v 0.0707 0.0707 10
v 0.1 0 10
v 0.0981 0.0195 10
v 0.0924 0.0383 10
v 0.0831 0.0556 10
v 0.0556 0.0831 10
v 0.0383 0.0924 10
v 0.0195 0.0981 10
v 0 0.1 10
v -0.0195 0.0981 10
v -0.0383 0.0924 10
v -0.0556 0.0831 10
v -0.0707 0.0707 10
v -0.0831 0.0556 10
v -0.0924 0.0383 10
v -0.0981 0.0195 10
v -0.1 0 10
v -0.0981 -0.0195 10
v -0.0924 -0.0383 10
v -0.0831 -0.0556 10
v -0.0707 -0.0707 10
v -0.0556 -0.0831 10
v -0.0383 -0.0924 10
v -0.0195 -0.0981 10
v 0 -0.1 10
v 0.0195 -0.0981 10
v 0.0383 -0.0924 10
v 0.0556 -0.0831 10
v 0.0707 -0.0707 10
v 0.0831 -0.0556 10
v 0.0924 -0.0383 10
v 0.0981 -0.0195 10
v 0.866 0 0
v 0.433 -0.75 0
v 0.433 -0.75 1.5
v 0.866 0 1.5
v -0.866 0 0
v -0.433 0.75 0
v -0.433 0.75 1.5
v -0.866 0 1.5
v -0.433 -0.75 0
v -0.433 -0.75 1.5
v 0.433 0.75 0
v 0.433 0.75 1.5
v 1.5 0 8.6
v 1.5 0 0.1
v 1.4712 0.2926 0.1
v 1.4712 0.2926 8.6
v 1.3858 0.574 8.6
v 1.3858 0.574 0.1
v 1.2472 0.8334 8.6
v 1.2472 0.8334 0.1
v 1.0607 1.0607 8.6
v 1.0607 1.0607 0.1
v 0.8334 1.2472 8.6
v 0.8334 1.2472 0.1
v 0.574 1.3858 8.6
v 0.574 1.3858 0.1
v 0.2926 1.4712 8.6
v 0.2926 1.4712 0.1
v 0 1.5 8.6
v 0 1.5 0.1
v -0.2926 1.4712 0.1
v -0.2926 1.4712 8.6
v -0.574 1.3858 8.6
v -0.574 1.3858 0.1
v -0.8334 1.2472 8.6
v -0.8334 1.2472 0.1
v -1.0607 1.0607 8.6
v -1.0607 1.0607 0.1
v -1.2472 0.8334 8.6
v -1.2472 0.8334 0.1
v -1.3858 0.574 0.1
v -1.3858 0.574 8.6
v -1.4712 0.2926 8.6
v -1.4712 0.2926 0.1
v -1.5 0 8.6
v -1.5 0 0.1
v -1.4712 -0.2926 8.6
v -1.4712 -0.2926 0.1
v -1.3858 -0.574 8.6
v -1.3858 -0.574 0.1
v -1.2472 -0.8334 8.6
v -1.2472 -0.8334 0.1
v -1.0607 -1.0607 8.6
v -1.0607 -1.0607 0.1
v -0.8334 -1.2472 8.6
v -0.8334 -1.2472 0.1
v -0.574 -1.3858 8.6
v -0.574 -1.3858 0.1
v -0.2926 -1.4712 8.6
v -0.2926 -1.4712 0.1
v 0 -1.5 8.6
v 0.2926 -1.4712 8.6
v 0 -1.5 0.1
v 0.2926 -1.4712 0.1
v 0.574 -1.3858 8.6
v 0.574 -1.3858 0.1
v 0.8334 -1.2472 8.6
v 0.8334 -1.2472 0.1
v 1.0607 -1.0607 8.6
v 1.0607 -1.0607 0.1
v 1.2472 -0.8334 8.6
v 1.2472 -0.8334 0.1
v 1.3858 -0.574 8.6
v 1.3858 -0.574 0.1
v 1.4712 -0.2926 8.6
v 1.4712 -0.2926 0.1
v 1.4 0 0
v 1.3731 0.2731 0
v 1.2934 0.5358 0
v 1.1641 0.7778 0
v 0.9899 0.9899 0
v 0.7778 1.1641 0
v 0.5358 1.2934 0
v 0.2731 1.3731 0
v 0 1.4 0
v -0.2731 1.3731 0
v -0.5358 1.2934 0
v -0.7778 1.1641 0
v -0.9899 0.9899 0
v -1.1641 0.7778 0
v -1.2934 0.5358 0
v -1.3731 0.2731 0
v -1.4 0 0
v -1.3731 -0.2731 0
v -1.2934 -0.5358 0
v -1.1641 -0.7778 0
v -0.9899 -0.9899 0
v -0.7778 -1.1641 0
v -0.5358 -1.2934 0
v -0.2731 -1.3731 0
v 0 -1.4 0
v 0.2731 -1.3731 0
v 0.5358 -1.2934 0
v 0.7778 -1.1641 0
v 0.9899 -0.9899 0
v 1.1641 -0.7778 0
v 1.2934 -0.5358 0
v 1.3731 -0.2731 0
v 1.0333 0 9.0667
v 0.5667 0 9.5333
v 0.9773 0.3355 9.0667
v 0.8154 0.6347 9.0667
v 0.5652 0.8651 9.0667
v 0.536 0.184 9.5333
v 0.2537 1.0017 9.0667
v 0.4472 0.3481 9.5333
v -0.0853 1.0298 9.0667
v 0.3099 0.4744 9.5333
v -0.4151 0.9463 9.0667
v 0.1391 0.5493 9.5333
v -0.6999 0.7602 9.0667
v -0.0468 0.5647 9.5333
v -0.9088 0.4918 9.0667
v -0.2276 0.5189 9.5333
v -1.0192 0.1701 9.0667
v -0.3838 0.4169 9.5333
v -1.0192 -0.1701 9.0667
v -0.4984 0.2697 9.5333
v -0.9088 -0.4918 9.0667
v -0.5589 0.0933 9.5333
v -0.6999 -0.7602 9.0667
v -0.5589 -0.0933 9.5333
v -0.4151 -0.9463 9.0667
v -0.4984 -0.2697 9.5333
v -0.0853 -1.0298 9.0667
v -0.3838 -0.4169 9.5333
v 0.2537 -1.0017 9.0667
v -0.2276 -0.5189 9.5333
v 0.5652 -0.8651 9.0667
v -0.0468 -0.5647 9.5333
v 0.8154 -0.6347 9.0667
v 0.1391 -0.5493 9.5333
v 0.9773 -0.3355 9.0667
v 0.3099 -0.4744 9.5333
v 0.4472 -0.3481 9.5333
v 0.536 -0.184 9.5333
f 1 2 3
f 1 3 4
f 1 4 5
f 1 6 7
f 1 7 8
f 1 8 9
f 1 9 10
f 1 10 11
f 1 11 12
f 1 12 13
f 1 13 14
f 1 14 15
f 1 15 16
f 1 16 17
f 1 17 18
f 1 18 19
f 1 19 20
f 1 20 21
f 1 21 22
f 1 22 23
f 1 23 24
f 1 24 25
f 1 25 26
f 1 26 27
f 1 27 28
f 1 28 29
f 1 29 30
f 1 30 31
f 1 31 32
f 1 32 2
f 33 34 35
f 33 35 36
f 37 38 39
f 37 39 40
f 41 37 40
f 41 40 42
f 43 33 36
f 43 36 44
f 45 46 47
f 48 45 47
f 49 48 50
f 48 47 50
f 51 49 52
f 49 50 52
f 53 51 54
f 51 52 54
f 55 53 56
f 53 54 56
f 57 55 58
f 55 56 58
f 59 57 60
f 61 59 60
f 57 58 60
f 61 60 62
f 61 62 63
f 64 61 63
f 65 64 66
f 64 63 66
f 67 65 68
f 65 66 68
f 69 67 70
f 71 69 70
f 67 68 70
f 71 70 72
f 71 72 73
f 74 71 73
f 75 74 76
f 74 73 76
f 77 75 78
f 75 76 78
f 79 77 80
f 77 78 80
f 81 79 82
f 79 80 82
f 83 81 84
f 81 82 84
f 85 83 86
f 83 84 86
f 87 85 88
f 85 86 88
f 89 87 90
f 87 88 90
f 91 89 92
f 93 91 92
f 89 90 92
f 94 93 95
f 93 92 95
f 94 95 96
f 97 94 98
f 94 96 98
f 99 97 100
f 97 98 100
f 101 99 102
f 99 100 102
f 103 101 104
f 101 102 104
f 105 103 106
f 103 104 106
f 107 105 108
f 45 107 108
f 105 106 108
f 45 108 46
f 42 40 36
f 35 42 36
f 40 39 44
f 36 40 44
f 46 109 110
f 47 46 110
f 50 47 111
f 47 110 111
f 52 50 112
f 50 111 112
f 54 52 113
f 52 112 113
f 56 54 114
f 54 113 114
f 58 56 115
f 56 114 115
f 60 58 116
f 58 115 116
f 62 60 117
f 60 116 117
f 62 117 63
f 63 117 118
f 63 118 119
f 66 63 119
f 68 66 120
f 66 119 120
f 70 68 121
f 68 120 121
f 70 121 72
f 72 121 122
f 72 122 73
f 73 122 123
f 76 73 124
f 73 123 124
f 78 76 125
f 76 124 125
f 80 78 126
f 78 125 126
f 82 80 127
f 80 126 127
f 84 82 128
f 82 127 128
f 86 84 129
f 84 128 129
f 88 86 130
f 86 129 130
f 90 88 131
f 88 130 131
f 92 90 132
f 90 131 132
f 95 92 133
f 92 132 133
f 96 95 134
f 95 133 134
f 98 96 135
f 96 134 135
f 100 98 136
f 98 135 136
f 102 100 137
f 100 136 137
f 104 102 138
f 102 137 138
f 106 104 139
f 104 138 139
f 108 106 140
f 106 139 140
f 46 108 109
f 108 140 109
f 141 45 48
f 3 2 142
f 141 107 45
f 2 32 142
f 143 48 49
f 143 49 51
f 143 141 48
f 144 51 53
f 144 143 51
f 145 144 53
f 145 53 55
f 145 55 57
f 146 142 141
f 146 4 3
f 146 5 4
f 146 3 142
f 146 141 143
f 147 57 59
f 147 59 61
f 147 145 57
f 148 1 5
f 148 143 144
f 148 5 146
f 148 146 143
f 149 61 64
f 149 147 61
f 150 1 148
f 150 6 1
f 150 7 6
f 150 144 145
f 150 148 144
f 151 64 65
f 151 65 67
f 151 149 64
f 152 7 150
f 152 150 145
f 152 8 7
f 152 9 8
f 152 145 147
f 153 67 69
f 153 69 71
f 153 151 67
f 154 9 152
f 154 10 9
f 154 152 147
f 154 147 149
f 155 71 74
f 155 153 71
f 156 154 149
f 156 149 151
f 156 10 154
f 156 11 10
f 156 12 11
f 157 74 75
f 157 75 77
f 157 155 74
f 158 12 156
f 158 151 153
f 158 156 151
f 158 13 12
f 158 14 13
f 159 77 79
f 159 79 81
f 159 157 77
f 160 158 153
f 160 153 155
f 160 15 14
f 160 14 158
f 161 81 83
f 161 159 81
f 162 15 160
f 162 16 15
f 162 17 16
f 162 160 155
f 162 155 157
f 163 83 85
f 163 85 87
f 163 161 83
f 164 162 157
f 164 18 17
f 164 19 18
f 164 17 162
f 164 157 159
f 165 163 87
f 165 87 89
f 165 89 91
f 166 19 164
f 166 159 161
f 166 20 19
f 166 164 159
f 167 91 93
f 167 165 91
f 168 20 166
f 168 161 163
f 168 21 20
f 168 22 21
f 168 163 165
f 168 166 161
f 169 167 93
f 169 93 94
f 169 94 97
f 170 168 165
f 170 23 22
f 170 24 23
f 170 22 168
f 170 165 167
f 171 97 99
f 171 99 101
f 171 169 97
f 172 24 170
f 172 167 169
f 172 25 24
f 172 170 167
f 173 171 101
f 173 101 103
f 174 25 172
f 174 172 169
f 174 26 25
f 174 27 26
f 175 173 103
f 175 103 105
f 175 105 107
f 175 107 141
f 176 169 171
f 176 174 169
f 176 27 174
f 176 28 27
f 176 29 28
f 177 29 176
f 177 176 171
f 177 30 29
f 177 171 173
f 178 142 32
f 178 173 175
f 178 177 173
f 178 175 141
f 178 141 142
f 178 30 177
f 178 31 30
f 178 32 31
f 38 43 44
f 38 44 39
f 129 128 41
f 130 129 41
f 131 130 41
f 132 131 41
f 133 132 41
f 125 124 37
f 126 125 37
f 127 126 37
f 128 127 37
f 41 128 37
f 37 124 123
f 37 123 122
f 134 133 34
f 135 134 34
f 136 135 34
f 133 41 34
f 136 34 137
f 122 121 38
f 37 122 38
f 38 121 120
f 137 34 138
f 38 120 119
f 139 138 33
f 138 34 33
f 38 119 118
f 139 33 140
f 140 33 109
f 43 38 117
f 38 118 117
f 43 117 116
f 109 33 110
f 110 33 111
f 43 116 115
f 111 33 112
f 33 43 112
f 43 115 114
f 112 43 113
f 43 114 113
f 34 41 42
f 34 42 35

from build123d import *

# Parameters (mm, degrees)
SKETCH028_R     = 1.5
PAD013_DEPTH    = 10
CHAMFER003_SIZE = 1.4
POCKET014_DEPTH = 1.5
CHAMFER002_SIZE = 0.1


with BuildPart() as part:
    # Sketch028 → Pad013 (new body)
    with BuildSketch(Plane.XY):
        Circle(SKETCH028_R)
    extrude(amount=PAD013_DEPTH)

    # Chamfer003
    chamfer003_edges = [part.edges().sort_by_distance(p)[0] for p in [
        (-1.5, 0, 10),
    ]]
    chamfer(chamfer003_edges, length=CHAMFER003_SIZE)

    # Sketch027 → Pocket014 (cut)
    with BuildSketch(Plane.XY):
        Polygon((0.433013, -0.75), (0.866025, 0), (0.433013, 0.75), (-0.433013, 0.75), (-0.866025, 0), (-0.433013, -0.75), align=None)
    extrude(amount=POCKET014_DEPTH, mode=Mode.SUBTRACT)

    # Chamfer002
    chamfer002_edges = [part.edges().sort_by_distance(p)[0] for p in [
        (-1.5, 0, 0),
    ]]
    chamfer(chamfer002_edges, length=CHAMFER002_SIZE)


solid = part.part
